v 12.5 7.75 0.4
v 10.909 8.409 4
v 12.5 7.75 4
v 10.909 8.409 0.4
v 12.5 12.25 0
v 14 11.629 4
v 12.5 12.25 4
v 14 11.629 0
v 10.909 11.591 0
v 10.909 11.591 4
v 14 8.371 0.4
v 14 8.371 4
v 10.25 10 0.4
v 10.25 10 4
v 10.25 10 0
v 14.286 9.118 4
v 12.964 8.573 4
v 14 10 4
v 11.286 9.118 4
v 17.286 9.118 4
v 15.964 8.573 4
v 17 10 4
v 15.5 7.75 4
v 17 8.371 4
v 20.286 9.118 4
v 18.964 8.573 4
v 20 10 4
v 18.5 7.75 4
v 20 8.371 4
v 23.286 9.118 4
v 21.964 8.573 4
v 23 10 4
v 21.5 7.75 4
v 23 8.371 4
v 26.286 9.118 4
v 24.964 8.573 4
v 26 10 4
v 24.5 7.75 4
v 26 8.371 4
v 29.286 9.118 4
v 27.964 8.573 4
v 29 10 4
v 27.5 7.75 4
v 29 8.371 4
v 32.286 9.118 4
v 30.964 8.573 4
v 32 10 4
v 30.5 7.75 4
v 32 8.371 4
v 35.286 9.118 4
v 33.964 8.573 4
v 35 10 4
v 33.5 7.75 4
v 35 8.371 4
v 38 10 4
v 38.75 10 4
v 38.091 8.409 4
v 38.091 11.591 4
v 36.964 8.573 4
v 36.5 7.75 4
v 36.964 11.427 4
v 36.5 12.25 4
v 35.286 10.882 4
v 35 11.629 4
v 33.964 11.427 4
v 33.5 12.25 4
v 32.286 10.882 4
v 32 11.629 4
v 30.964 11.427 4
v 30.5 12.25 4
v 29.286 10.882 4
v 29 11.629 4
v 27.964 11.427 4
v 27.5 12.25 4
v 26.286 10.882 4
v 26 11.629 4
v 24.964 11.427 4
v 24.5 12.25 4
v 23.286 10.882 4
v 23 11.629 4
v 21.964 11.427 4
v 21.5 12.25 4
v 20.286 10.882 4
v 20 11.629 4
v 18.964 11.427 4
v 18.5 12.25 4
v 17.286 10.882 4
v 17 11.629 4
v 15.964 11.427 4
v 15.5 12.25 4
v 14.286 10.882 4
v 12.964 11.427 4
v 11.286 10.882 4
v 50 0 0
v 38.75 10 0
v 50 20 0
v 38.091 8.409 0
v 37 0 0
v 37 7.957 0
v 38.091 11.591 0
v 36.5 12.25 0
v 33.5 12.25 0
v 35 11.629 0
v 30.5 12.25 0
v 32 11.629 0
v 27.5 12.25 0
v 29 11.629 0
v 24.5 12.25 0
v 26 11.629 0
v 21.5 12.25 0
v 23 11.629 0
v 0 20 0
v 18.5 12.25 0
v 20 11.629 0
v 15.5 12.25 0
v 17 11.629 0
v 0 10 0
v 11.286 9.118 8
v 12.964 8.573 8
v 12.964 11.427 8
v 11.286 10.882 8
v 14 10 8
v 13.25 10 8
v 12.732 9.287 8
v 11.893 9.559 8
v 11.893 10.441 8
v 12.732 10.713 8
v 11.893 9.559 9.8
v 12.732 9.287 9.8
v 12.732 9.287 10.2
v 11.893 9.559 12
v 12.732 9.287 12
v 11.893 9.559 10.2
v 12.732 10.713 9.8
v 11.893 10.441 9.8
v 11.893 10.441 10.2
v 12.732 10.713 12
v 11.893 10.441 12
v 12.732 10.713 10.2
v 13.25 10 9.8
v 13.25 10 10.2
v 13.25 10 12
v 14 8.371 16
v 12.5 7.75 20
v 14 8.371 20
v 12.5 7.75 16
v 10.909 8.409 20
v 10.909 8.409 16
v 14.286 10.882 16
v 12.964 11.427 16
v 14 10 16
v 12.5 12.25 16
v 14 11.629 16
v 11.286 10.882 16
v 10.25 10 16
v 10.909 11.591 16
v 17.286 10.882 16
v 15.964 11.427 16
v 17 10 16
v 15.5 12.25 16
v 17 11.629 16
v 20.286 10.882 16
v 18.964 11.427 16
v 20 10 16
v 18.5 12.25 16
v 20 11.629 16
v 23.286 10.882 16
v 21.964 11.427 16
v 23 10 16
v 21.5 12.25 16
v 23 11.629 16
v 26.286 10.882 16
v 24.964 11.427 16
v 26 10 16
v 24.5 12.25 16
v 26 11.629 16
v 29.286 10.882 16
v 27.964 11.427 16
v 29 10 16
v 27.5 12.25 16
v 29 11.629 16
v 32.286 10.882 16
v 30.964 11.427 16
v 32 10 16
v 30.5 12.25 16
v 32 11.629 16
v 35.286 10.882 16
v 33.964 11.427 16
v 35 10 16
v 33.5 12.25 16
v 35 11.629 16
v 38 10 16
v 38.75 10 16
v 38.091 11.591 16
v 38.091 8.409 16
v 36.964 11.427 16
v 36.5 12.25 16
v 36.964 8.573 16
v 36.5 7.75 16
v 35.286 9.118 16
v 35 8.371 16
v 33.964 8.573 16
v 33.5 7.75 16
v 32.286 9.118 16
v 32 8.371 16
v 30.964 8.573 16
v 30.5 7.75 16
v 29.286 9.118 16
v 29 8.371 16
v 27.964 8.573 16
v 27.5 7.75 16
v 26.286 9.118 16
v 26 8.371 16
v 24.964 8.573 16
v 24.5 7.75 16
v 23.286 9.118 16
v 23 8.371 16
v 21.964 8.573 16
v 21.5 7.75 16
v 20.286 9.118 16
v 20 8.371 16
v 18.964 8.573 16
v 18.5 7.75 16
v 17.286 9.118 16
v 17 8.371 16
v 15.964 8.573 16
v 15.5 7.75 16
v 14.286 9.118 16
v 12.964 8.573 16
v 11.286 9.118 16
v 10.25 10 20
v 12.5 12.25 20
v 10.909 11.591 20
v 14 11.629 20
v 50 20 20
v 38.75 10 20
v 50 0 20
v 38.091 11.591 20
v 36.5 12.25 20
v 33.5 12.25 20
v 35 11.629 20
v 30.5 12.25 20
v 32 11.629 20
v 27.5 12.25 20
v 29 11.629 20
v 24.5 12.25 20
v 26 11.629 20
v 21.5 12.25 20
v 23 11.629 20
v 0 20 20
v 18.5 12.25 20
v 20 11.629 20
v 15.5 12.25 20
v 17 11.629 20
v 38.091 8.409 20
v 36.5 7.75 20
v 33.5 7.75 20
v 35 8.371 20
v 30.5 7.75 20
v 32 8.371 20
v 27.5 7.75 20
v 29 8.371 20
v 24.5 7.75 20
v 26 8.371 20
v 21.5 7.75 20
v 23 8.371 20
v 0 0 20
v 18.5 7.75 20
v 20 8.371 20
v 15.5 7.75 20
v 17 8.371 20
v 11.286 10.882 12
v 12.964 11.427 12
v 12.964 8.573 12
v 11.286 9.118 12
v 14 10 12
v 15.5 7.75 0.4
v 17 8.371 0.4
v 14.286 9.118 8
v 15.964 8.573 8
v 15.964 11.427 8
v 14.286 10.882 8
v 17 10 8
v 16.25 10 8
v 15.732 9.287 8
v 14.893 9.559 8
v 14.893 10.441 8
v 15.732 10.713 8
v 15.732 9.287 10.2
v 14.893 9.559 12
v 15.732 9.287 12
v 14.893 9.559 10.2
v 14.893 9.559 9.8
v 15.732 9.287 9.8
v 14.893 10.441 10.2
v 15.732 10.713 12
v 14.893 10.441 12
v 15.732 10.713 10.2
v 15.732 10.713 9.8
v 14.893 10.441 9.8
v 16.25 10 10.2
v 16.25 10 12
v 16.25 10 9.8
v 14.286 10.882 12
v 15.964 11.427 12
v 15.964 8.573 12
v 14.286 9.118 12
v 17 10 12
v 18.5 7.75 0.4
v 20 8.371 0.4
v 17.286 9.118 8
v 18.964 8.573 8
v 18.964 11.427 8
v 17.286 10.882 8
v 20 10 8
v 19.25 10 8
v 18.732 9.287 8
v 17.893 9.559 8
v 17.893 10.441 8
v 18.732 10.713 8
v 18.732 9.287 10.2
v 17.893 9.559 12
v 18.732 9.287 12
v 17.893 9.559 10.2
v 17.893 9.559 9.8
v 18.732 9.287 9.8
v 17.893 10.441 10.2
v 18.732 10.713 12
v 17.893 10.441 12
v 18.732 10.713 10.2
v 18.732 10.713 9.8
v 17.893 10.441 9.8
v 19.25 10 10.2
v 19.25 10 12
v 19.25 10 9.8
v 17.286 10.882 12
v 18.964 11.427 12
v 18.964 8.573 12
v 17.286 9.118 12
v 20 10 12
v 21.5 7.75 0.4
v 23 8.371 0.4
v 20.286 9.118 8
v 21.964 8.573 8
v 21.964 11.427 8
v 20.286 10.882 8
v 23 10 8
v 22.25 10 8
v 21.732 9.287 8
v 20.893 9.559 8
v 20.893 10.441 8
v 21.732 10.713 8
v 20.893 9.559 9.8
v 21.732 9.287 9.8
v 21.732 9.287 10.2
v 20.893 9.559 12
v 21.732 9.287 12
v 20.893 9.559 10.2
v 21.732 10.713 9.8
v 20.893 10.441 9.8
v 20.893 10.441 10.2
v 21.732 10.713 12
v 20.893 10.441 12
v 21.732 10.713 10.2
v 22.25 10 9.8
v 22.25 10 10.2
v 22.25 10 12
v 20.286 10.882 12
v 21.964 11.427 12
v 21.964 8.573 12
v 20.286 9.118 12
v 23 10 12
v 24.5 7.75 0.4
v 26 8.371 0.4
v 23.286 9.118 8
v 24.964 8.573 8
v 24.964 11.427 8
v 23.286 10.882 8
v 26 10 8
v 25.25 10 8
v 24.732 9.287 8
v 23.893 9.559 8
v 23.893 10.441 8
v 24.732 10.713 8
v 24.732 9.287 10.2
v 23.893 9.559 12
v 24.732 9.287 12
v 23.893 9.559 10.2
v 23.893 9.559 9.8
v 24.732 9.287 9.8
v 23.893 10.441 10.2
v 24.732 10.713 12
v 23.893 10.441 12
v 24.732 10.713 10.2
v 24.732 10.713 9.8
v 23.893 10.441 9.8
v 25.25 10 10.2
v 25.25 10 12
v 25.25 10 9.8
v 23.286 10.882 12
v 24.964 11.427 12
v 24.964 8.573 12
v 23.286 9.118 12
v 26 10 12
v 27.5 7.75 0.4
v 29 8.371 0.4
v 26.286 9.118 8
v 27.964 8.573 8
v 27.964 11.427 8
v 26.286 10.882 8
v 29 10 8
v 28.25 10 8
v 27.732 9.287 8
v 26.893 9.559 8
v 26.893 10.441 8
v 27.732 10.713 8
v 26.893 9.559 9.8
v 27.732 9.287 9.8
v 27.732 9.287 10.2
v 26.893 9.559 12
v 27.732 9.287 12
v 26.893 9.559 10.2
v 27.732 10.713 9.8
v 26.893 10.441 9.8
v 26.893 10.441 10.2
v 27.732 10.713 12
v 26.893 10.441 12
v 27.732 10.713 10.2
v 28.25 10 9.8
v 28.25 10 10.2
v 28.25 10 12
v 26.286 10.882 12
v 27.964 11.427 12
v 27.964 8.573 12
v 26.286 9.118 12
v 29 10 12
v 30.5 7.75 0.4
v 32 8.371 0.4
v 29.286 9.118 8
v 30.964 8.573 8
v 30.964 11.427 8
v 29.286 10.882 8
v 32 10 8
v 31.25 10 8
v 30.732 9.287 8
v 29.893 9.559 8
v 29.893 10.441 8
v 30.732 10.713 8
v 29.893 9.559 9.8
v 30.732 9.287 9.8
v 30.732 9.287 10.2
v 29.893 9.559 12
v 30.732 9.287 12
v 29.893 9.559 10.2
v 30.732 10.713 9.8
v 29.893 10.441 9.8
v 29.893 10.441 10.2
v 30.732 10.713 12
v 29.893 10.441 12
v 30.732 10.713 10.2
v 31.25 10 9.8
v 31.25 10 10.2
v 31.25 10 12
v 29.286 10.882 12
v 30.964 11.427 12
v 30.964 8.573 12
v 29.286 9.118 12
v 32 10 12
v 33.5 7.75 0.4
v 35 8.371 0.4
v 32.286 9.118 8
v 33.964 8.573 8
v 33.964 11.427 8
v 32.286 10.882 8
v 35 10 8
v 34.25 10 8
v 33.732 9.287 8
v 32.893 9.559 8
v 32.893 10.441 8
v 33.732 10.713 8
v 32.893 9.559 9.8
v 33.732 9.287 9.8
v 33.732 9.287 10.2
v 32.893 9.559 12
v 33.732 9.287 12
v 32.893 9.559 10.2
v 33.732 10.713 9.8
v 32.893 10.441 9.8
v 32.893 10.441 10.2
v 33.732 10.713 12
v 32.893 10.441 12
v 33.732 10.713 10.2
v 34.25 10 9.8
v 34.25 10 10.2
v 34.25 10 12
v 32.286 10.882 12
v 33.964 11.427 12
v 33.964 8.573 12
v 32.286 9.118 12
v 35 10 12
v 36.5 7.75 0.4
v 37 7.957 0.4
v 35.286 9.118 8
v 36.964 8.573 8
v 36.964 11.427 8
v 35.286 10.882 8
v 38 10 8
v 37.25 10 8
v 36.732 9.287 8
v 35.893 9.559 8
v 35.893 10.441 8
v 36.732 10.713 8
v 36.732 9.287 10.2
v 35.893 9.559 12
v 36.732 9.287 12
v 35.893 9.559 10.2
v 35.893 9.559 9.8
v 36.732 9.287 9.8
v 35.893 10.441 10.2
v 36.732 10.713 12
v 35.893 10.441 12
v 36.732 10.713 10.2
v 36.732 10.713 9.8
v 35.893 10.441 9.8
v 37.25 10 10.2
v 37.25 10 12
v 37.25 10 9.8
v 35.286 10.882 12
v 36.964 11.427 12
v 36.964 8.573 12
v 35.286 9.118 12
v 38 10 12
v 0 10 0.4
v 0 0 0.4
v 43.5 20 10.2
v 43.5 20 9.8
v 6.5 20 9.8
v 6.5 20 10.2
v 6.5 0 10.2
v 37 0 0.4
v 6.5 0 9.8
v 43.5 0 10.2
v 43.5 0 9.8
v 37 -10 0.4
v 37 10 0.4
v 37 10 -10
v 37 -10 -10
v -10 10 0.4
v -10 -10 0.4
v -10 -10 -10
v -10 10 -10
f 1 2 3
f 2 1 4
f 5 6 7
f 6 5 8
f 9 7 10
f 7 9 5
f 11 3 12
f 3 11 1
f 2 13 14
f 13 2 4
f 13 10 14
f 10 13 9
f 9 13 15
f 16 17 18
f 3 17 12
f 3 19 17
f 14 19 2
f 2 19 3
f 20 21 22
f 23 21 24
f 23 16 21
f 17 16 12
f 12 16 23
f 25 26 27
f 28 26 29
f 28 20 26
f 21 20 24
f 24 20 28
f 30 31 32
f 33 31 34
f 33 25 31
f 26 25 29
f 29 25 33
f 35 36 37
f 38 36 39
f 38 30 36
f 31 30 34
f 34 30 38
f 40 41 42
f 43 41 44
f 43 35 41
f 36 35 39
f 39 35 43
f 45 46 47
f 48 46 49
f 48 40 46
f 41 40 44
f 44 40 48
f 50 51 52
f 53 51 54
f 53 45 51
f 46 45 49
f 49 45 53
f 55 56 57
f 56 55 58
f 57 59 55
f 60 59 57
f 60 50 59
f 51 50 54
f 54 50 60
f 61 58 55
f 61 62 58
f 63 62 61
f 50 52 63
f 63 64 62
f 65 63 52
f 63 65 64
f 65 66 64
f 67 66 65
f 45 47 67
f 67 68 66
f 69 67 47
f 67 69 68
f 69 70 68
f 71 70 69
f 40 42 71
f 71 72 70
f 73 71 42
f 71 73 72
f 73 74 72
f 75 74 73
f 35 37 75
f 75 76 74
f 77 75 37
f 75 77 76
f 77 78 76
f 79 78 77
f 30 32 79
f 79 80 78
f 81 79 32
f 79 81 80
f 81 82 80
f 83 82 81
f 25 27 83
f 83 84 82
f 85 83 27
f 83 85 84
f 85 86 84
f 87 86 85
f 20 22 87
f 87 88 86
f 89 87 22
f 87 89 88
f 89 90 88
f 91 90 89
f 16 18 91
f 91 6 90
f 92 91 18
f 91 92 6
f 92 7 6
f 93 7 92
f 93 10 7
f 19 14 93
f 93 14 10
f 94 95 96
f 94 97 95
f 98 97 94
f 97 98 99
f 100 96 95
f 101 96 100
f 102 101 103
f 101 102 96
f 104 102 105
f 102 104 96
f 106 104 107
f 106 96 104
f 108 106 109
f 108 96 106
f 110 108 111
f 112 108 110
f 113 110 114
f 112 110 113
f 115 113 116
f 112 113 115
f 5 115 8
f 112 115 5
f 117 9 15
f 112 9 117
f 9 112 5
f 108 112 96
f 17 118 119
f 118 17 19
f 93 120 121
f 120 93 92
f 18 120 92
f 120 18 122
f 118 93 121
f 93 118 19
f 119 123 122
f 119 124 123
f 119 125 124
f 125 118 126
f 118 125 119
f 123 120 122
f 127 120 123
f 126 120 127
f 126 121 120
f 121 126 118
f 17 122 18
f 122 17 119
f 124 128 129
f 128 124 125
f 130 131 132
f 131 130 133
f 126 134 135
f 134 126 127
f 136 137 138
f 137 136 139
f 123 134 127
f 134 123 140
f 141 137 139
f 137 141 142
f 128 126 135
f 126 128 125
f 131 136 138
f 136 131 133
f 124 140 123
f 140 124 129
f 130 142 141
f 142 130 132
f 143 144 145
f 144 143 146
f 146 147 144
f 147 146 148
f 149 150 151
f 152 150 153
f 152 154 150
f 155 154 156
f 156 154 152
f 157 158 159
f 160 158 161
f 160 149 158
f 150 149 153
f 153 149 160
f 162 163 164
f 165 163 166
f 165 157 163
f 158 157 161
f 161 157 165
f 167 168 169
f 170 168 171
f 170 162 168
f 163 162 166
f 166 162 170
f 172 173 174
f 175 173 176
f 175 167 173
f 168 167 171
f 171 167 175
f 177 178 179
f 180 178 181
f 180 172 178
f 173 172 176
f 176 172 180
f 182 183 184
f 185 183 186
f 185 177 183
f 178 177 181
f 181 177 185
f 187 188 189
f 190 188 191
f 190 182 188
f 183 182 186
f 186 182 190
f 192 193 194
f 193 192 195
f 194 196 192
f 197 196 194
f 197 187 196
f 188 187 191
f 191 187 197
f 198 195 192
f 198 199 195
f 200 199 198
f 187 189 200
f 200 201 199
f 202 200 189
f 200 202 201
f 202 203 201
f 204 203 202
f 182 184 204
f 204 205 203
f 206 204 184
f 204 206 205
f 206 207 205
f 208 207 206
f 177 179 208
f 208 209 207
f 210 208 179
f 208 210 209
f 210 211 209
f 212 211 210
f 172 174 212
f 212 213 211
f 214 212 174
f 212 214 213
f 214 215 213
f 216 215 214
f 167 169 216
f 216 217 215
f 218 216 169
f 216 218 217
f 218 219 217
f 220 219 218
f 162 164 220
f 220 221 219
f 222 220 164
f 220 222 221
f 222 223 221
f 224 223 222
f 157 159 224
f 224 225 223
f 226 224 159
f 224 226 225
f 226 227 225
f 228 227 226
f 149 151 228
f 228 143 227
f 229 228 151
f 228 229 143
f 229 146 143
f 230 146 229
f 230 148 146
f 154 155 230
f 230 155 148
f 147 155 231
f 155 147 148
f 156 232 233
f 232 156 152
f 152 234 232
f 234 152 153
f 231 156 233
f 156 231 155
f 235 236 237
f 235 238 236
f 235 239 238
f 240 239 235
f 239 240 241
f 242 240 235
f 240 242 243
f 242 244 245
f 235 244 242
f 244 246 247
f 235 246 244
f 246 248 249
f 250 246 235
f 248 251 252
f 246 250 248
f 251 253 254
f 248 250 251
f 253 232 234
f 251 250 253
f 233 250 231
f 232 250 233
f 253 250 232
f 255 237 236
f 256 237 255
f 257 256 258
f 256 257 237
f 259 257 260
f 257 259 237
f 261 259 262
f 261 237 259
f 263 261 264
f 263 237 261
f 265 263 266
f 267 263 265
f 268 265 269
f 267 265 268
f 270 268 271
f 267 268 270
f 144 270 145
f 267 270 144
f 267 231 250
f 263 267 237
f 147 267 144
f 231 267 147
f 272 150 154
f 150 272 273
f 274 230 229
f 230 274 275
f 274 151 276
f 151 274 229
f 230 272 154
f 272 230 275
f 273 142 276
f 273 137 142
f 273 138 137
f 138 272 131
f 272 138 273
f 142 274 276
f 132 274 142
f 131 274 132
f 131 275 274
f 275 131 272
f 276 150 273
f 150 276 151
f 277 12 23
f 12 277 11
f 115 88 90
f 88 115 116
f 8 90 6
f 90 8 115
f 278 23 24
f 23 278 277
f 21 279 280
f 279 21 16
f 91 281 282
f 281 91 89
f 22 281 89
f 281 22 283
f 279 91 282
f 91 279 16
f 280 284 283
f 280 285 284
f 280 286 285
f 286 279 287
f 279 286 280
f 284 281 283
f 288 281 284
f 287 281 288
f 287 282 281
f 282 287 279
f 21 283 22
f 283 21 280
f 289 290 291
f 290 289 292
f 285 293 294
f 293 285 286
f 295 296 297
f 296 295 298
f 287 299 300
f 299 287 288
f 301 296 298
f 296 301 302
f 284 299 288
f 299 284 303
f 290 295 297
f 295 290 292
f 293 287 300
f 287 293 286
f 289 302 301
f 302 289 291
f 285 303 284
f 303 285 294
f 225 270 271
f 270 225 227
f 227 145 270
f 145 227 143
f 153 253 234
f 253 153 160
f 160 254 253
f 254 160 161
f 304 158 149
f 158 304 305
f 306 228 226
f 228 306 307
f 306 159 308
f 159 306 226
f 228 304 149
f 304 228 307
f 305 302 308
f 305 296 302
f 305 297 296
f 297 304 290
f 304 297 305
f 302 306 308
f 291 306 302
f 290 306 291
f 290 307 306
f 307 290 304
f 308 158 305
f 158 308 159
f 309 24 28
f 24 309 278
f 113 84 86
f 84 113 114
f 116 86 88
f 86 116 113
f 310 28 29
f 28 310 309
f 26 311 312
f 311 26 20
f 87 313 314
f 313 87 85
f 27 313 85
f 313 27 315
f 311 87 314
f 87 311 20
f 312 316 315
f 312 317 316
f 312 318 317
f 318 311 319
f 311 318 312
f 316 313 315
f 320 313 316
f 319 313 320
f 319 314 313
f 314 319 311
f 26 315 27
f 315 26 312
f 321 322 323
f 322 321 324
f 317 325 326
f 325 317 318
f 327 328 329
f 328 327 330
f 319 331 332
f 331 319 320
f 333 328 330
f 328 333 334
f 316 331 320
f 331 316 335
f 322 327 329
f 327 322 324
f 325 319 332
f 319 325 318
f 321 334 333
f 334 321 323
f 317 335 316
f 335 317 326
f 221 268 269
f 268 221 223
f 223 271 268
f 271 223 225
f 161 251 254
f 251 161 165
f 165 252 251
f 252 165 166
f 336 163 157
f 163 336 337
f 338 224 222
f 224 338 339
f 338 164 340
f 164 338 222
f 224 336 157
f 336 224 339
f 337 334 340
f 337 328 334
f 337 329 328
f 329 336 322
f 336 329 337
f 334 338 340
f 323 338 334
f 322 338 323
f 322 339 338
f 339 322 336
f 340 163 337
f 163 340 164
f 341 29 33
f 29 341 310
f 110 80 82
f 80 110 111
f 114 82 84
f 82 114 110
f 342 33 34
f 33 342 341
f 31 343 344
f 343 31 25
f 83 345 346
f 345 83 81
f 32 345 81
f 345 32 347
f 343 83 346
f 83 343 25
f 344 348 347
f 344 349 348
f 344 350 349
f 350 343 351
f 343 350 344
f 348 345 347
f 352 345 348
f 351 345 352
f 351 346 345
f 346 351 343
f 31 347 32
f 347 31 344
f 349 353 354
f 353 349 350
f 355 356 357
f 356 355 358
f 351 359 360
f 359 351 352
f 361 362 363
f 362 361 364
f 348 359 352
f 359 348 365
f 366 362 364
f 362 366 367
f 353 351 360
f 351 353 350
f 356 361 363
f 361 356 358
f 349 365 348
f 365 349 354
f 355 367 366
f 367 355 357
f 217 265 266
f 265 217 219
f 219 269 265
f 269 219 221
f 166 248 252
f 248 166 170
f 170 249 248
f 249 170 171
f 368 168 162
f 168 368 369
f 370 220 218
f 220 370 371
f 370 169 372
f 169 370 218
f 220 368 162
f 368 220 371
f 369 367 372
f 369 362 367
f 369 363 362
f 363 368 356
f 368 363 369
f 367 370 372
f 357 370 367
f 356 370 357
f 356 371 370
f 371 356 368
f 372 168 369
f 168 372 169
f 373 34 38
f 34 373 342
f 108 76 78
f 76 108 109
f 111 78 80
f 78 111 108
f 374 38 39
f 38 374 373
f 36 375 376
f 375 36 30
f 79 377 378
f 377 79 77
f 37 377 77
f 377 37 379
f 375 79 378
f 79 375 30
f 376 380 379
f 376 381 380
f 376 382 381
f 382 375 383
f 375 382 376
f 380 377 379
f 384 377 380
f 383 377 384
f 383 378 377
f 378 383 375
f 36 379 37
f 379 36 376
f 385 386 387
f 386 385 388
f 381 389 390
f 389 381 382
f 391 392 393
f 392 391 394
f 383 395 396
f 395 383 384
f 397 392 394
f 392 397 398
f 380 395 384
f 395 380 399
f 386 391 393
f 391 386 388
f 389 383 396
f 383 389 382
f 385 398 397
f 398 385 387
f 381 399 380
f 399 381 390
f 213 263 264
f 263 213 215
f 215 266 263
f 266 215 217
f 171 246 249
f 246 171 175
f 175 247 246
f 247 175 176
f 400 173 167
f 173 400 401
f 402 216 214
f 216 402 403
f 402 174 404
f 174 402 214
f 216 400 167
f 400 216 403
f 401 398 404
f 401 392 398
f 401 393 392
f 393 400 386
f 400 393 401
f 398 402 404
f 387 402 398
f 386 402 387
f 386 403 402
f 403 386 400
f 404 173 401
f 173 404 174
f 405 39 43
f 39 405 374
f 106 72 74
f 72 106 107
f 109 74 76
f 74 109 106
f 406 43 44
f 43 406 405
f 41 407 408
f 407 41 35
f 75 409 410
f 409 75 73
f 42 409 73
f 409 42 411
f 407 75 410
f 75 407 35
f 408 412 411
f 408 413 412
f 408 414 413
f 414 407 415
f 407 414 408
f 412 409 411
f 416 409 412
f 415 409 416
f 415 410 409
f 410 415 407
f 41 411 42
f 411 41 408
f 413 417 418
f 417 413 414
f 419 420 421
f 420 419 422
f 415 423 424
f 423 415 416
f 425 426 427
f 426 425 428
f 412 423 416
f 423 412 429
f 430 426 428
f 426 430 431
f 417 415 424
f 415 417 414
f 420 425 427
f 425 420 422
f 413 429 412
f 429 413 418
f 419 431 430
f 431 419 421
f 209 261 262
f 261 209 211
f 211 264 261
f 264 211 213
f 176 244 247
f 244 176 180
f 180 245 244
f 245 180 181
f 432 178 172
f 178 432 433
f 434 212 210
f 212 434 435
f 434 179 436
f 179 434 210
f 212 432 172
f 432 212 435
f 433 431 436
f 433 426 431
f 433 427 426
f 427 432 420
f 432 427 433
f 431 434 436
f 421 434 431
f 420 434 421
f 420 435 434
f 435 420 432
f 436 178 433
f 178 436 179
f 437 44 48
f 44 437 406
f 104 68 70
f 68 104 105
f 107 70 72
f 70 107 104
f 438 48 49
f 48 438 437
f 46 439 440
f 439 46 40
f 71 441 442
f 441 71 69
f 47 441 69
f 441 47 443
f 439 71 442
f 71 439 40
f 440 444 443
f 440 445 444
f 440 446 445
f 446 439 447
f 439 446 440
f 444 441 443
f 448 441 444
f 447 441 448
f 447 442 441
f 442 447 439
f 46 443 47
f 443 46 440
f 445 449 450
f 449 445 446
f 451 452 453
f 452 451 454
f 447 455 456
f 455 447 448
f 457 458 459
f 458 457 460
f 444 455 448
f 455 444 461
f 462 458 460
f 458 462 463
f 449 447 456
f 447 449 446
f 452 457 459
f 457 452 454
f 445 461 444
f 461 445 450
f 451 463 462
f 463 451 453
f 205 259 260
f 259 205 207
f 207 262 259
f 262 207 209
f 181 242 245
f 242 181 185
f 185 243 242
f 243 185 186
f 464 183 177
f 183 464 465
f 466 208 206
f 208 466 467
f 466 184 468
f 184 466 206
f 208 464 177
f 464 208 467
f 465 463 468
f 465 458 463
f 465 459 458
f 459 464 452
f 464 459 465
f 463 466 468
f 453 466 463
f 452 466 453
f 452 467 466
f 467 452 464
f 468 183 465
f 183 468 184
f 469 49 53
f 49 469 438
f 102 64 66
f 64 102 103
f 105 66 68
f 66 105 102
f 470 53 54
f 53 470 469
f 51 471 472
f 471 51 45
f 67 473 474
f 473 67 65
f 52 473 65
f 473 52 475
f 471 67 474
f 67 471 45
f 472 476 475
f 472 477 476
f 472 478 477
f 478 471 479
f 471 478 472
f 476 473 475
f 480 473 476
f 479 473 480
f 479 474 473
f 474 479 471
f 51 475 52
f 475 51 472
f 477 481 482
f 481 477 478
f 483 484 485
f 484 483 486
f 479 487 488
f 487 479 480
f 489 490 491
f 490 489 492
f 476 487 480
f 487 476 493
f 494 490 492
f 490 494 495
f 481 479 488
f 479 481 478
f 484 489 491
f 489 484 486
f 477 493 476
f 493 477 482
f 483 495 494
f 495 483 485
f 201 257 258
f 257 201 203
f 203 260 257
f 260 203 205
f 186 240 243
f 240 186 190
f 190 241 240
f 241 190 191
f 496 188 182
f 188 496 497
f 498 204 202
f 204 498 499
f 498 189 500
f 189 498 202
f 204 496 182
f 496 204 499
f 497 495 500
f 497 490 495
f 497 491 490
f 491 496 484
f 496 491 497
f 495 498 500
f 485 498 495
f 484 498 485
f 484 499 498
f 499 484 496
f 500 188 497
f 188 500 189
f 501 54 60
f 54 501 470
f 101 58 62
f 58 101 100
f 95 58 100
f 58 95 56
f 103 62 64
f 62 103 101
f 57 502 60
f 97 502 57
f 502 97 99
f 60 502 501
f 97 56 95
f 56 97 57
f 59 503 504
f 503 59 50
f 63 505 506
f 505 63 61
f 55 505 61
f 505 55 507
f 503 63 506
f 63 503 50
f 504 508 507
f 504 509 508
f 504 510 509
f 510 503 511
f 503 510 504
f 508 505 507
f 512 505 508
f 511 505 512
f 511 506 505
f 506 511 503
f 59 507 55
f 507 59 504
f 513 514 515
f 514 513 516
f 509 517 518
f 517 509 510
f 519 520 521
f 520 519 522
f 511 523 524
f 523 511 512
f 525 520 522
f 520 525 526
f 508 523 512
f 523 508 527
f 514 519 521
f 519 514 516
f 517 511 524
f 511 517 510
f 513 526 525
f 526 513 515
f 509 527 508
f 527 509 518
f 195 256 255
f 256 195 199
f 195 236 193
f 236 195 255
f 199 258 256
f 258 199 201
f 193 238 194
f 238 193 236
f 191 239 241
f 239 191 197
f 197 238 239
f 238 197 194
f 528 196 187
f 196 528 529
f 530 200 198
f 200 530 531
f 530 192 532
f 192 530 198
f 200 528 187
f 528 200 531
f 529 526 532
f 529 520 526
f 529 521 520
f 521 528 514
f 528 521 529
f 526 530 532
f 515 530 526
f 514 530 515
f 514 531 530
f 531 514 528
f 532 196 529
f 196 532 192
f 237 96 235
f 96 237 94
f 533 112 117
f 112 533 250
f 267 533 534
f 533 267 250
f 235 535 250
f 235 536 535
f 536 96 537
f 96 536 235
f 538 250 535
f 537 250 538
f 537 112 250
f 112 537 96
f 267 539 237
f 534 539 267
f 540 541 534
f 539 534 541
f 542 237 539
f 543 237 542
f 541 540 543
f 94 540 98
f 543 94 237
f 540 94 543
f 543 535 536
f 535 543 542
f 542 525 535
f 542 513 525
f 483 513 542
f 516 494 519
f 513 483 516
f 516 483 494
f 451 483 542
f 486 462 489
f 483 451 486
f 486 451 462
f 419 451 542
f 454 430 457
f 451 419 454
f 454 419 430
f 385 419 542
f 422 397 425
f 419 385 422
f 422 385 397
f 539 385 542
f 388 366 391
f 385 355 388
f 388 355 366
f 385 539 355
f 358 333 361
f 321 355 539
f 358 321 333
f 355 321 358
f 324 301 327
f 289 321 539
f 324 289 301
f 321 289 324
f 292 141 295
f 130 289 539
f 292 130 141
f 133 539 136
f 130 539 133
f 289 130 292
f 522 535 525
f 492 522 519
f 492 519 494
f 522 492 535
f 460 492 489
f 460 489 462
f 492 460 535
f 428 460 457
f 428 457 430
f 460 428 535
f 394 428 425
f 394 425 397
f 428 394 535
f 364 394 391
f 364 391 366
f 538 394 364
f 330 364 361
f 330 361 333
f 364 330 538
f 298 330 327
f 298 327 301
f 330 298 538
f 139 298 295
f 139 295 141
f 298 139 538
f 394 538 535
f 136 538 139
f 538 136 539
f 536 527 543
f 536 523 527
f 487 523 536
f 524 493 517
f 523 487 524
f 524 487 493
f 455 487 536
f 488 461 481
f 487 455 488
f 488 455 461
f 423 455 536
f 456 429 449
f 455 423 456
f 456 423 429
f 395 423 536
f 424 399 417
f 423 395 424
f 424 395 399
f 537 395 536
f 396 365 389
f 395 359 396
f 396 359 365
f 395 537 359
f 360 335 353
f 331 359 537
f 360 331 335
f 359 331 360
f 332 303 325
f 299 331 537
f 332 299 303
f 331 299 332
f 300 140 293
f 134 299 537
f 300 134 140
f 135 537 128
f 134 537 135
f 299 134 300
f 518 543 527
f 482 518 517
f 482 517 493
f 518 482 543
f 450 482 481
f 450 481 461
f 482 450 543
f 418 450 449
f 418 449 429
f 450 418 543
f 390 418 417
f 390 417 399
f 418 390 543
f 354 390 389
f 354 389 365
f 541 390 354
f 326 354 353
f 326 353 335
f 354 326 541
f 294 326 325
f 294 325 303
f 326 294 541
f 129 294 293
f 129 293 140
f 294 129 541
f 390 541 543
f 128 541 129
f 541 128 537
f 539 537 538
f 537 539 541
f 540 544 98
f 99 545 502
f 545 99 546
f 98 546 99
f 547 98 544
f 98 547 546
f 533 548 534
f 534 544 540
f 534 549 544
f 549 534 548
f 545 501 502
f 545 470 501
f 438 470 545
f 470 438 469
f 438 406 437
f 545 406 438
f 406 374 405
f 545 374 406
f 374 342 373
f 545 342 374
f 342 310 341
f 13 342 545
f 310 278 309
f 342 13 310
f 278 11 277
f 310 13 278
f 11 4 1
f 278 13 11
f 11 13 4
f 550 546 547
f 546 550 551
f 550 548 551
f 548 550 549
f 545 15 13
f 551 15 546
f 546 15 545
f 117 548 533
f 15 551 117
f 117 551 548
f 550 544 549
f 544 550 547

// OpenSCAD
led_rand_diam = 4.5;
led_rand_height = 4;
led_body_diam = 3;
led_body_height = 4;
led_beam_diam = 1.5;
led_beam_height = 2;

slide_depth = 20;
slide_thickness = 5;

nr_of_dots = 9;

box_width = 50;
box_depth = 20;
box_height = 20;

slid_width = nr_of_dots * led_body_diam + 10;
slid_height = 0.4;
slid_depth = box_depth;

module led(x = 0, y = 0, z = 0)
{
    
    translate([x, y, z])
    {
        // Led rand.
        cylinder(h = led_rand_height, r1 = led_rand_diam / 2, r2 = led_rand_diam / 2);
        
    } 
        
    // Led body.
    translate([x, y, z + led_rand_height])
    {
        cylinder(h = led_body_height, r1 = led_body_diam / 2, r2 = led_body_diam / 2);
    }
        
    // lead beam.
    translate([x, y, z + led_rand_height + led_body_height])
    {
        cylinder(h = led_beam_height, r1 = led_beam_diam / 2, r2 = led_beam_diam / 2);
    }

}

// Slide left.
translate([-10, -10, -10])
cube(size = [slid_width + 2 * slide_thickness,
    slide_depth, slid_height + 2 * slide_thickness]);

// Slide right.

difference()
{
    cube(size = [box_width, box_depth, box_height]);
    
    // slit.
    translate([(box_width - slid_width) / 2, 0, (box_height - slid_height) / 2])
    {    
        cube(size = [slid_width, slid_depth, slid_height]);
        
    }
    
    // Row of IR Leds.
    edge = (box_width - slid_width) / 2;
    for (x = [edge + 6: led_body_diam : box_width - edge - 6])
    {
        led(x, box_depth / 2, 0);
        //led_rand_height + led_body_height + led_beam_height);
        
        rotate(a = [180, 0, 0])
            led(x, -(box_depth / 2), -box_height);
        
    }
    
}
